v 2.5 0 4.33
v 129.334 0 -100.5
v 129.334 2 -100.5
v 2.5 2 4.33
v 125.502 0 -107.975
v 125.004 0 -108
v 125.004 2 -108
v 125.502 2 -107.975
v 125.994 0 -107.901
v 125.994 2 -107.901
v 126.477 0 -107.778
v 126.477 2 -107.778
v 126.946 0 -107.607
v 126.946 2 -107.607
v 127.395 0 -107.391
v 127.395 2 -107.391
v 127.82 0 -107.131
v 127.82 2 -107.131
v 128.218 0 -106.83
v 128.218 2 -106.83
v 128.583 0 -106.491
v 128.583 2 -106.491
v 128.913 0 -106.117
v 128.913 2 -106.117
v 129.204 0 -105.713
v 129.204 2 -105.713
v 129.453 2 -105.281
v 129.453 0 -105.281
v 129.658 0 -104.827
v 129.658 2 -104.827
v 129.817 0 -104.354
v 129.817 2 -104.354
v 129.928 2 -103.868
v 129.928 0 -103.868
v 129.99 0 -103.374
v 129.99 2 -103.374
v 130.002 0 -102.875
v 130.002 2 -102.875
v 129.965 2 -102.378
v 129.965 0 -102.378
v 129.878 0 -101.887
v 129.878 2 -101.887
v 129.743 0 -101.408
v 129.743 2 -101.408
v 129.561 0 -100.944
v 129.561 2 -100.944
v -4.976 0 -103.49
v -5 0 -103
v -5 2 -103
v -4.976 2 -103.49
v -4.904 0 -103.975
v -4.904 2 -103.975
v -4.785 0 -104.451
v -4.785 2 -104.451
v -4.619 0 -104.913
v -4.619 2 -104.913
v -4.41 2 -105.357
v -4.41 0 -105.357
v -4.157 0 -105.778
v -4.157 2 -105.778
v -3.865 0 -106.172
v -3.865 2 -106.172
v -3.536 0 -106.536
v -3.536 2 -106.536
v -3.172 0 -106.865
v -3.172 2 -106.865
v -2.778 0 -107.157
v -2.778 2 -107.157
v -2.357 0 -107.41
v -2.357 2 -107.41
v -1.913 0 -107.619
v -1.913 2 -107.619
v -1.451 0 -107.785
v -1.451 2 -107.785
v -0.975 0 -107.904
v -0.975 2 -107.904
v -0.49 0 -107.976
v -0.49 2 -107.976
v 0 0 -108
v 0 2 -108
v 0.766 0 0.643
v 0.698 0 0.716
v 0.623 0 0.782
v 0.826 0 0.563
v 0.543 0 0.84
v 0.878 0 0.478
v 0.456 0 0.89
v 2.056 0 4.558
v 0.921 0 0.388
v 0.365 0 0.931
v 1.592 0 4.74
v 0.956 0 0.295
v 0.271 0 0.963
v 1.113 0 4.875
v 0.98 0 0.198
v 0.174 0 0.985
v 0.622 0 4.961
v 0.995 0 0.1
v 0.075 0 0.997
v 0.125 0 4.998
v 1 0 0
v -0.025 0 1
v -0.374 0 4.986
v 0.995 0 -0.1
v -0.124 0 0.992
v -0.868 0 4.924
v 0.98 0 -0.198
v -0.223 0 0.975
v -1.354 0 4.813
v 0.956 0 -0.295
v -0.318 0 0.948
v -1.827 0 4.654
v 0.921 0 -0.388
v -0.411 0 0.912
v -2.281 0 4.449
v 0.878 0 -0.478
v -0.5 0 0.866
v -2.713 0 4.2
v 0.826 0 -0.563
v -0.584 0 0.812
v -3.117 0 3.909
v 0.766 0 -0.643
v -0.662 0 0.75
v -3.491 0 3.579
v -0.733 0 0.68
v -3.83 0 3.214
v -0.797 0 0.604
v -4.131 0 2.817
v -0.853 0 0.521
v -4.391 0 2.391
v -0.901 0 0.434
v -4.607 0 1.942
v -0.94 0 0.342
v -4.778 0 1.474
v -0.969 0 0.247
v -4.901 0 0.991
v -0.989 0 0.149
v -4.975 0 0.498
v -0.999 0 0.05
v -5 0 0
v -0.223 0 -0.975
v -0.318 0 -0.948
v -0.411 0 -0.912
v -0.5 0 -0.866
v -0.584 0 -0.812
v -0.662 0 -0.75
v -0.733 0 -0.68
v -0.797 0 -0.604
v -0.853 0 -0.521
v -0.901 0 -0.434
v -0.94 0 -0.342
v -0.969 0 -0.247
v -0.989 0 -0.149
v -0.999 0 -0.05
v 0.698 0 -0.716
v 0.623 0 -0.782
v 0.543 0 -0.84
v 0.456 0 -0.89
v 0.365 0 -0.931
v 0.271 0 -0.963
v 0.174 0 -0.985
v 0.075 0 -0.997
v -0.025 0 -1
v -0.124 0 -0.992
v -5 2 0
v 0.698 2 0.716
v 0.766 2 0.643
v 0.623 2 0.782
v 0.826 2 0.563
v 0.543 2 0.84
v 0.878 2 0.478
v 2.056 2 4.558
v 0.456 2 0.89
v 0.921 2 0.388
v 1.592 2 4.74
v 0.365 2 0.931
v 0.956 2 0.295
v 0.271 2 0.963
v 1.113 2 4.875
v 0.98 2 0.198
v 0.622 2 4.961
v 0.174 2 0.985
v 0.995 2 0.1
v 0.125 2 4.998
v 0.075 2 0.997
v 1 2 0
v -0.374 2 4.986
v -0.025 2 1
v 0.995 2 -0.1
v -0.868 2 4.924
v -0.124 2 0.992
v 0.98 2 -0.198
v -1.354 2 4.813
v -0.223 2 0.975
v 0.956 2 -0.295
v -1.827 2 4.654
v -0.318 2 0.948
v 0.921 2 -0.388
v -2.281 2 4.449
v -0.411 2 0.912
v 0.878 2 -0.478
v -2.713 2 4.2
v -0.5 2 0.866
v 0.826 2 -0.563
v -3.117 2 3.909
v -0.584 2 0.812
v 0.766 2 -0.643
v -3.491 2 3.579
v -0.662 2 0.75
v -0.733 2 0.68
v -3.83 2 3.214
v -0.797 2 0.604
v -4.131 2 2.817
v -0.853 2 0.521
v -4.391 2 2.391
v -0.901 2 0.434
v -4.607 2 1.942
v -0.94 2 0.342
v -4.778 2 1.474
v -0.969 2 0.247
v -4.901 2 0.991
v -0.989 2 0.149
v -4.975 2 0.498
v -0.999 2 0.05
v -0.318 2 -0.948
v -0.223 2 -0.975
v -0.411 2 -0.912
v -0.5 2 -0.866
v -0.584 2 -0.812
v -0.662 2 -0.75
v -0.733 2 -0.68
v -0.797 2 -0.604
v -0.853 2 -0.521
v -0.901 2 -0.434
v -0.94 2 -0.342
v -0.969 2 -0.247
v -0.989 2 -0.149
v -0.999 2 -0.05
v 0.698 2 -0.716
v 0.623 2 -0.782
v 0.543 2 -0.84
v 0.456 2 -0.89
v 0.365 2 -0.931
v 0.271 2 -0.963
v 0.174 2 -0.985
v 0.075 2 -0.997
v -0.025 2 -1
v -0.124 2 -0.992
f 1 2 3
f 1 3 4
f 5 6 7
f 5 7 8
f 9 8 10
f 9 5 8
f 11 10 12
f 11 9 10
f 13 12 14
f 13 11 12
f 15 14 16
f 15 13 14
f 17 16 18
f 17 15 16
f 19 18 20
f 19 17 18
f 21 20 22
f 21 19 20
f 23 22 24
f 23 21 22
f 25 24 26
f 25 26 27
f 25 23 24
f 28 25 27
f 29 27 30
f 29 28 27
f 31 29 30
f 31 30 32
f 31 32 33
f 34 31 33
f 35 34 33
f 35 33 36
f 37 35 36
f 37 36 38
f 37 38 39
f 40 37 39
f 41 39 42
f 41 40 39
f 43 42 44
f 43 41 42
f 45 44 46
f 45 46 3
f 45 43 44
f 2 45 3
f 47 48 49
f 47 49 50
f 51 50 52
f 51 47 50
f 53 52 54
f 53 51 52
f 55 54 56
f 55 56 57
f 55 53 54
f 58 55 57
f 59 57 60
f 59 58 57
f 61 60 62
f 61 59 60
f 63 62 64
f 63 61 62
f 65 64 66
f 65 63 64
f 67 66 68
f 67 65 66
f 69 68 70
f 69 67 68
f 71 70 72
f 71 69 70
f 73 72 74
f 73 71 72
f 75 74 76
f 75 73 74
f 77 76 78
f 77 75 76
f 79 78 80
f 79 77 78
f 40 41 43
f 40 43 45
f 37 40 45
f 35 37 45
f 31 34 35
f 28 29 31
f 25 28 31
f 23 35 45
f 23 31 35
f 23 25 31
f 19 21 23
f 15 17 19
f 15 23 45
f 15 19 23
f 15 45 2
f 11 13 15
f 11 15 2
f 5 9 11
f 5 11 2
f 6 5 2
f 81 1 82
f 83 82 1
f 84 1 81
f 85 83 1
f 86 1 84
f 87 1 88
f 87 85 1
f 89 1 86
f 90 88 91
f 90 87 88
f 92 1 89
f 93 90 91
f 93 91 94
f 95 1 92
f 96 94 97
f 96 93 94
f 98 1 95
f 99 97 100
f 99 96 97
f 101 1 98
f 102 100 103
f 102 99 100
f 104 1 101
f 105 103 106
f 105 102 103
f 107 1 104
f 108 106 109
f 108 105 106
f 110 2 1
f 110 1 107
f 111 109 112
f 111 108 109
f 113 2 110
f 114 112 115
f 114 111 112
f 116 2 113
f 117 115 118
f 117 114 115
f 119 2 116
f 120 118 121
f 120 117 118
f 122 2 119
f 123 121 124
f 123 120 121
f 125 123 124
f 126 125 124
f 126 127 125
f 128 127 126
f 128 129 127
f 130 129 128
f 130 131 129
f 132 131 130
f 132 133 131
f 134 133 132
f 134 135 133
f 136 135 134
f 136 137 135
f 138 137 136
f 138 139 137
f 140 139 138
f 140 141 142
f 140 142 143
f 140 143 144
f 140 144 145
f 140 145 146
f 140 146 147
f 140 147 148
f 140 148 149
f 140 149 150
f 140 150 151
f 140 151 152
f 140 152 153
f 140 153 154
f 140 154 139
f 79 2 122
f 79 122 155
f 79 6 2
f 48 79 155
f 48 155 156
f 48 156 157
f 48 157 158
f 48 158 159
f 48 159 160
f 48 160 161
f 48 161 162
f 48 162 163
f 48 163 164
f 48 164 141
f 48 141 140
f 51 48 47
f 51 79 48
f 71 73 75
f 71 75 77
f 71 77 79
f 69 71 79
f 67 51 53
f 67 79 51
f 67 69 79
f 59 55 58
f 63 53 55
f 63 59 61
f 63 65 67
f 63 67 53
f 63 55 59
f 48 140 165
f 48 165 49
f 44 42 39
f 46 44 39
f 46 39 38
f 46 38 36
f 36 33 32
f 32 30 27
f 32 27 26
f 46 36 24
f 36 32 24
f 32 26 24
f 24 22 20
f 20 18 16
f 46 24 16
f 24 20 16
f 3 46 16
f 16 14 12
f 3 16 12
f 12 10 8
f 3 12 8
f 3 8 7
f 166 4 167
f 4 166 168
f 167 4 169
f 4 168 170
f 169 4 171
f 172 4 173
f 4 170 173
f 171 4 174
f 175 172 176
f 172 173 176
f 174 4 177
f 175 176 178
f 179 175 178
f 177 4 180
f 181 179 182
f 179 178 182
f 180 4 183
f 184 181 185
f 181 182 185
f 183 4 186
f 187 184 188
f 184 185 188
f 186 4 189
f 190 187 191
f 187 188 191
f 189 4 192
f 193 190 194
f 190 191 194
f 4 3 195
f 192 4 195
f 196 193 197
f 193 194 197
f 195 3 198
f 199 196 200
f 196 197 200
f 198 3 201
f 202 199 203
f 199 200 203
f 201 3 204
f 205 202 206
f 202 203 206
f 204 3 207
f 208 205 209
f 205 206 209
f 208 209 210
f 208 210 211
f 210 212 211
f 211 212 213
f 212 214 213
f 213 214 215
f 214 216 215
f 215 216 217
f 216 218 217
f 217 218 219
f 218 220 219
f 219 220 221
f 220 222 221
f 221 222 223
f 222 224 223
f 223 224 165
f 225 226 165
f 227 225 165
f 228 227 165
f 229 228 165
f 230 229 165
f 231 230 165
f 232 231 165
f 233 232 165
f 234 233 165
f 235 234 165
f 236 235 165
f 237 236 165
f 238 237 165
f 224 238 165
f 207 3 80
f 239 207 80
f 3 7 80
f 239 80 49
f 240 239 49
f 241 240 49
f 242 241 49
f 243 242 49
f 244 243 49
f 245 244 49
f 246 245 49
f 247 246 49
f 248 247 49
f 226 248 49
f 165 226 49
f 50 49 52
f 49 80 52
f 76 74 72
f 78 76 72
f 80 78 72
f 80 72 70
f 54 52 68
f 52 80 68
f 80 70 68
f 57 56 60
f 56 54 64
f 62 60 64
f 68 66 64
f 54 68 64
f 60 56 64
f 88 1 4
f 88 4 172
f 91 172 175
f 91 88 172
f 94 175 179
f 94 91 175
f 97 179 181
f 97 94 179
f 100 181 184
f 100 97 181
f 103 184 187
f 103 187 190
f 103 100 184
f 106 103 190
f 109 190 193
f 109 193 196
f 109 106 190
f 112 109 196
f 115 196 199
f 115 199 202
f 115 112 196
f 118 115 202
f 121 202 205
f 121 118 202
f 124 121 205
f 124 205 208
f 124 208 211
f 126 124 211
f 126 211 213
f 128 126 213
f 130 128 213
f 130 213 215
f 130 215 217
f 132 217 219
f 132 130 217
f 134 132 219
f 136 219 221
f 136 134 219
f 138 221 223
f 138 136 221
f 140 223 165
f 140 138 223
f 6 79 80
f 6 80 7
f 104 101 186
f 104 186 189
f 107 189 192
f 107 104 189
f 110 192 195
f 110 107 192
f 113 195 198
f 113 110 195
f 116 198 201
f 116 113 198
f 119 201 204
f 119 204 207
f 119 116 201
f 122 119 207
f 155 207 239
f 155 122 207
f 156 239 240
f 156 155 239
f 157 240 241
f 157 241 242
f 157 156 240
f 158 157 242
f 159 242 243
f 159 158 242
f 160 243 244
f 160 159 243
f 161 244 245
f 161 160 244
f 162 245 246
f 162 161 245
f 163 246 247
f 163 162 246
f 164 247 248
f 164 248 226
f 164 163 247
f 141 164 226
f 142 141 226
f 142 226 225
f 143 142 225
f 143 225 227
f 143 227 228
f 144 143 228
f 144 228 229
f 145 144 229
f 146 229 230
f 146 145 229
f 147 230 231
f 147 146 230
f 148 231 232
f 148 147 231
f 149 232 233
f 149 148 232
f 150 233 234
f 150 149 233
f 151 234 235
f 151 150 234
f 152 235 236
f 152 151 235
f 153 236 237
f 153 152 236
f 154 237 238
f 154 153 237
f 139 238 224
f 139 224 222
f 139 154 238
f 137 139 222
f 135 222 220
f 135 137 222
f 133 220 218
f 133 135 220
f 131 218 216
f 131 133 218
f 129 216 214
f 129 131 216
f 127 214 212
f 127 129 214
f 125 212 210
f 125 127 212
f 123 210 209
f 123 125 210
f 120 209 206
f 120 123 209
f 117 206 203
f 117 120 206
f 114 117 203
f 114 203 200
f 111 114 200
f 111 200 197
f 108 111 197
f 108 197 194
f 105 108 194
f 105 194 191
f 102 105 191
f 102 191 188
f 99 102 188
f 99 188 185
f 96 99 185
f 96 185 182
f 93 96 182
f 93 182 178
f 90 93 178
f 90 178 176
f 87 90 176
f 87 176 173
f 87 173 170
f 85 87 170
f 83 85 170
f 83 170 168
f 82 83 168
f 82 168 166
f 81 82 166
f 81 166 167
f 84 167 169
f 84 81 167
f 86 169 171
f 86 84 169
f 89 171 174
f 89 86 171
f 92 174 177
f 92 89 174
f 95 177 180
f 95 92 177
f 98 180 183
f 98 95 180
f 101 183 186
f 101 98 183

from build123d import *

# Parameters (mm, degrees)
ESQUISSE1_R        = 1
BOSS_EXTRU_2_DEPTH = 2


with BuildPart() as part:
    # Esquisse1 → Boss.-Extru.2 (new body)
    with BuildSketch(Plane(origin=(0, 0, 0), x_dir=(1, 0, 0), z_dir=(0, 1, 0))):
        with BuildLine():
            Line((129.333821146, 100.5), (2.5, -4.330127019))
            ThreePointArc((2.5, -4.330127019), (-2.5, -4.330127019), (-5, 0))
            Line((-5, 0), (-5, 103))
            ThreePointArc((-5, 103), (-3.535533906, 106.535533906), (0, 108))
            Line((0, 108), (125.003694127, 108))
            ThreePointArc((125.003694127, 108), (129.333821146, 105.5), (129.333821146, 100.5))
        make_face()
        Circle(ESQUISSE1_R, mode=Mode.SUBTRACT)
    extrude(amount=BOSS_EXTRU_2_DEPTH)


solid = part.part
